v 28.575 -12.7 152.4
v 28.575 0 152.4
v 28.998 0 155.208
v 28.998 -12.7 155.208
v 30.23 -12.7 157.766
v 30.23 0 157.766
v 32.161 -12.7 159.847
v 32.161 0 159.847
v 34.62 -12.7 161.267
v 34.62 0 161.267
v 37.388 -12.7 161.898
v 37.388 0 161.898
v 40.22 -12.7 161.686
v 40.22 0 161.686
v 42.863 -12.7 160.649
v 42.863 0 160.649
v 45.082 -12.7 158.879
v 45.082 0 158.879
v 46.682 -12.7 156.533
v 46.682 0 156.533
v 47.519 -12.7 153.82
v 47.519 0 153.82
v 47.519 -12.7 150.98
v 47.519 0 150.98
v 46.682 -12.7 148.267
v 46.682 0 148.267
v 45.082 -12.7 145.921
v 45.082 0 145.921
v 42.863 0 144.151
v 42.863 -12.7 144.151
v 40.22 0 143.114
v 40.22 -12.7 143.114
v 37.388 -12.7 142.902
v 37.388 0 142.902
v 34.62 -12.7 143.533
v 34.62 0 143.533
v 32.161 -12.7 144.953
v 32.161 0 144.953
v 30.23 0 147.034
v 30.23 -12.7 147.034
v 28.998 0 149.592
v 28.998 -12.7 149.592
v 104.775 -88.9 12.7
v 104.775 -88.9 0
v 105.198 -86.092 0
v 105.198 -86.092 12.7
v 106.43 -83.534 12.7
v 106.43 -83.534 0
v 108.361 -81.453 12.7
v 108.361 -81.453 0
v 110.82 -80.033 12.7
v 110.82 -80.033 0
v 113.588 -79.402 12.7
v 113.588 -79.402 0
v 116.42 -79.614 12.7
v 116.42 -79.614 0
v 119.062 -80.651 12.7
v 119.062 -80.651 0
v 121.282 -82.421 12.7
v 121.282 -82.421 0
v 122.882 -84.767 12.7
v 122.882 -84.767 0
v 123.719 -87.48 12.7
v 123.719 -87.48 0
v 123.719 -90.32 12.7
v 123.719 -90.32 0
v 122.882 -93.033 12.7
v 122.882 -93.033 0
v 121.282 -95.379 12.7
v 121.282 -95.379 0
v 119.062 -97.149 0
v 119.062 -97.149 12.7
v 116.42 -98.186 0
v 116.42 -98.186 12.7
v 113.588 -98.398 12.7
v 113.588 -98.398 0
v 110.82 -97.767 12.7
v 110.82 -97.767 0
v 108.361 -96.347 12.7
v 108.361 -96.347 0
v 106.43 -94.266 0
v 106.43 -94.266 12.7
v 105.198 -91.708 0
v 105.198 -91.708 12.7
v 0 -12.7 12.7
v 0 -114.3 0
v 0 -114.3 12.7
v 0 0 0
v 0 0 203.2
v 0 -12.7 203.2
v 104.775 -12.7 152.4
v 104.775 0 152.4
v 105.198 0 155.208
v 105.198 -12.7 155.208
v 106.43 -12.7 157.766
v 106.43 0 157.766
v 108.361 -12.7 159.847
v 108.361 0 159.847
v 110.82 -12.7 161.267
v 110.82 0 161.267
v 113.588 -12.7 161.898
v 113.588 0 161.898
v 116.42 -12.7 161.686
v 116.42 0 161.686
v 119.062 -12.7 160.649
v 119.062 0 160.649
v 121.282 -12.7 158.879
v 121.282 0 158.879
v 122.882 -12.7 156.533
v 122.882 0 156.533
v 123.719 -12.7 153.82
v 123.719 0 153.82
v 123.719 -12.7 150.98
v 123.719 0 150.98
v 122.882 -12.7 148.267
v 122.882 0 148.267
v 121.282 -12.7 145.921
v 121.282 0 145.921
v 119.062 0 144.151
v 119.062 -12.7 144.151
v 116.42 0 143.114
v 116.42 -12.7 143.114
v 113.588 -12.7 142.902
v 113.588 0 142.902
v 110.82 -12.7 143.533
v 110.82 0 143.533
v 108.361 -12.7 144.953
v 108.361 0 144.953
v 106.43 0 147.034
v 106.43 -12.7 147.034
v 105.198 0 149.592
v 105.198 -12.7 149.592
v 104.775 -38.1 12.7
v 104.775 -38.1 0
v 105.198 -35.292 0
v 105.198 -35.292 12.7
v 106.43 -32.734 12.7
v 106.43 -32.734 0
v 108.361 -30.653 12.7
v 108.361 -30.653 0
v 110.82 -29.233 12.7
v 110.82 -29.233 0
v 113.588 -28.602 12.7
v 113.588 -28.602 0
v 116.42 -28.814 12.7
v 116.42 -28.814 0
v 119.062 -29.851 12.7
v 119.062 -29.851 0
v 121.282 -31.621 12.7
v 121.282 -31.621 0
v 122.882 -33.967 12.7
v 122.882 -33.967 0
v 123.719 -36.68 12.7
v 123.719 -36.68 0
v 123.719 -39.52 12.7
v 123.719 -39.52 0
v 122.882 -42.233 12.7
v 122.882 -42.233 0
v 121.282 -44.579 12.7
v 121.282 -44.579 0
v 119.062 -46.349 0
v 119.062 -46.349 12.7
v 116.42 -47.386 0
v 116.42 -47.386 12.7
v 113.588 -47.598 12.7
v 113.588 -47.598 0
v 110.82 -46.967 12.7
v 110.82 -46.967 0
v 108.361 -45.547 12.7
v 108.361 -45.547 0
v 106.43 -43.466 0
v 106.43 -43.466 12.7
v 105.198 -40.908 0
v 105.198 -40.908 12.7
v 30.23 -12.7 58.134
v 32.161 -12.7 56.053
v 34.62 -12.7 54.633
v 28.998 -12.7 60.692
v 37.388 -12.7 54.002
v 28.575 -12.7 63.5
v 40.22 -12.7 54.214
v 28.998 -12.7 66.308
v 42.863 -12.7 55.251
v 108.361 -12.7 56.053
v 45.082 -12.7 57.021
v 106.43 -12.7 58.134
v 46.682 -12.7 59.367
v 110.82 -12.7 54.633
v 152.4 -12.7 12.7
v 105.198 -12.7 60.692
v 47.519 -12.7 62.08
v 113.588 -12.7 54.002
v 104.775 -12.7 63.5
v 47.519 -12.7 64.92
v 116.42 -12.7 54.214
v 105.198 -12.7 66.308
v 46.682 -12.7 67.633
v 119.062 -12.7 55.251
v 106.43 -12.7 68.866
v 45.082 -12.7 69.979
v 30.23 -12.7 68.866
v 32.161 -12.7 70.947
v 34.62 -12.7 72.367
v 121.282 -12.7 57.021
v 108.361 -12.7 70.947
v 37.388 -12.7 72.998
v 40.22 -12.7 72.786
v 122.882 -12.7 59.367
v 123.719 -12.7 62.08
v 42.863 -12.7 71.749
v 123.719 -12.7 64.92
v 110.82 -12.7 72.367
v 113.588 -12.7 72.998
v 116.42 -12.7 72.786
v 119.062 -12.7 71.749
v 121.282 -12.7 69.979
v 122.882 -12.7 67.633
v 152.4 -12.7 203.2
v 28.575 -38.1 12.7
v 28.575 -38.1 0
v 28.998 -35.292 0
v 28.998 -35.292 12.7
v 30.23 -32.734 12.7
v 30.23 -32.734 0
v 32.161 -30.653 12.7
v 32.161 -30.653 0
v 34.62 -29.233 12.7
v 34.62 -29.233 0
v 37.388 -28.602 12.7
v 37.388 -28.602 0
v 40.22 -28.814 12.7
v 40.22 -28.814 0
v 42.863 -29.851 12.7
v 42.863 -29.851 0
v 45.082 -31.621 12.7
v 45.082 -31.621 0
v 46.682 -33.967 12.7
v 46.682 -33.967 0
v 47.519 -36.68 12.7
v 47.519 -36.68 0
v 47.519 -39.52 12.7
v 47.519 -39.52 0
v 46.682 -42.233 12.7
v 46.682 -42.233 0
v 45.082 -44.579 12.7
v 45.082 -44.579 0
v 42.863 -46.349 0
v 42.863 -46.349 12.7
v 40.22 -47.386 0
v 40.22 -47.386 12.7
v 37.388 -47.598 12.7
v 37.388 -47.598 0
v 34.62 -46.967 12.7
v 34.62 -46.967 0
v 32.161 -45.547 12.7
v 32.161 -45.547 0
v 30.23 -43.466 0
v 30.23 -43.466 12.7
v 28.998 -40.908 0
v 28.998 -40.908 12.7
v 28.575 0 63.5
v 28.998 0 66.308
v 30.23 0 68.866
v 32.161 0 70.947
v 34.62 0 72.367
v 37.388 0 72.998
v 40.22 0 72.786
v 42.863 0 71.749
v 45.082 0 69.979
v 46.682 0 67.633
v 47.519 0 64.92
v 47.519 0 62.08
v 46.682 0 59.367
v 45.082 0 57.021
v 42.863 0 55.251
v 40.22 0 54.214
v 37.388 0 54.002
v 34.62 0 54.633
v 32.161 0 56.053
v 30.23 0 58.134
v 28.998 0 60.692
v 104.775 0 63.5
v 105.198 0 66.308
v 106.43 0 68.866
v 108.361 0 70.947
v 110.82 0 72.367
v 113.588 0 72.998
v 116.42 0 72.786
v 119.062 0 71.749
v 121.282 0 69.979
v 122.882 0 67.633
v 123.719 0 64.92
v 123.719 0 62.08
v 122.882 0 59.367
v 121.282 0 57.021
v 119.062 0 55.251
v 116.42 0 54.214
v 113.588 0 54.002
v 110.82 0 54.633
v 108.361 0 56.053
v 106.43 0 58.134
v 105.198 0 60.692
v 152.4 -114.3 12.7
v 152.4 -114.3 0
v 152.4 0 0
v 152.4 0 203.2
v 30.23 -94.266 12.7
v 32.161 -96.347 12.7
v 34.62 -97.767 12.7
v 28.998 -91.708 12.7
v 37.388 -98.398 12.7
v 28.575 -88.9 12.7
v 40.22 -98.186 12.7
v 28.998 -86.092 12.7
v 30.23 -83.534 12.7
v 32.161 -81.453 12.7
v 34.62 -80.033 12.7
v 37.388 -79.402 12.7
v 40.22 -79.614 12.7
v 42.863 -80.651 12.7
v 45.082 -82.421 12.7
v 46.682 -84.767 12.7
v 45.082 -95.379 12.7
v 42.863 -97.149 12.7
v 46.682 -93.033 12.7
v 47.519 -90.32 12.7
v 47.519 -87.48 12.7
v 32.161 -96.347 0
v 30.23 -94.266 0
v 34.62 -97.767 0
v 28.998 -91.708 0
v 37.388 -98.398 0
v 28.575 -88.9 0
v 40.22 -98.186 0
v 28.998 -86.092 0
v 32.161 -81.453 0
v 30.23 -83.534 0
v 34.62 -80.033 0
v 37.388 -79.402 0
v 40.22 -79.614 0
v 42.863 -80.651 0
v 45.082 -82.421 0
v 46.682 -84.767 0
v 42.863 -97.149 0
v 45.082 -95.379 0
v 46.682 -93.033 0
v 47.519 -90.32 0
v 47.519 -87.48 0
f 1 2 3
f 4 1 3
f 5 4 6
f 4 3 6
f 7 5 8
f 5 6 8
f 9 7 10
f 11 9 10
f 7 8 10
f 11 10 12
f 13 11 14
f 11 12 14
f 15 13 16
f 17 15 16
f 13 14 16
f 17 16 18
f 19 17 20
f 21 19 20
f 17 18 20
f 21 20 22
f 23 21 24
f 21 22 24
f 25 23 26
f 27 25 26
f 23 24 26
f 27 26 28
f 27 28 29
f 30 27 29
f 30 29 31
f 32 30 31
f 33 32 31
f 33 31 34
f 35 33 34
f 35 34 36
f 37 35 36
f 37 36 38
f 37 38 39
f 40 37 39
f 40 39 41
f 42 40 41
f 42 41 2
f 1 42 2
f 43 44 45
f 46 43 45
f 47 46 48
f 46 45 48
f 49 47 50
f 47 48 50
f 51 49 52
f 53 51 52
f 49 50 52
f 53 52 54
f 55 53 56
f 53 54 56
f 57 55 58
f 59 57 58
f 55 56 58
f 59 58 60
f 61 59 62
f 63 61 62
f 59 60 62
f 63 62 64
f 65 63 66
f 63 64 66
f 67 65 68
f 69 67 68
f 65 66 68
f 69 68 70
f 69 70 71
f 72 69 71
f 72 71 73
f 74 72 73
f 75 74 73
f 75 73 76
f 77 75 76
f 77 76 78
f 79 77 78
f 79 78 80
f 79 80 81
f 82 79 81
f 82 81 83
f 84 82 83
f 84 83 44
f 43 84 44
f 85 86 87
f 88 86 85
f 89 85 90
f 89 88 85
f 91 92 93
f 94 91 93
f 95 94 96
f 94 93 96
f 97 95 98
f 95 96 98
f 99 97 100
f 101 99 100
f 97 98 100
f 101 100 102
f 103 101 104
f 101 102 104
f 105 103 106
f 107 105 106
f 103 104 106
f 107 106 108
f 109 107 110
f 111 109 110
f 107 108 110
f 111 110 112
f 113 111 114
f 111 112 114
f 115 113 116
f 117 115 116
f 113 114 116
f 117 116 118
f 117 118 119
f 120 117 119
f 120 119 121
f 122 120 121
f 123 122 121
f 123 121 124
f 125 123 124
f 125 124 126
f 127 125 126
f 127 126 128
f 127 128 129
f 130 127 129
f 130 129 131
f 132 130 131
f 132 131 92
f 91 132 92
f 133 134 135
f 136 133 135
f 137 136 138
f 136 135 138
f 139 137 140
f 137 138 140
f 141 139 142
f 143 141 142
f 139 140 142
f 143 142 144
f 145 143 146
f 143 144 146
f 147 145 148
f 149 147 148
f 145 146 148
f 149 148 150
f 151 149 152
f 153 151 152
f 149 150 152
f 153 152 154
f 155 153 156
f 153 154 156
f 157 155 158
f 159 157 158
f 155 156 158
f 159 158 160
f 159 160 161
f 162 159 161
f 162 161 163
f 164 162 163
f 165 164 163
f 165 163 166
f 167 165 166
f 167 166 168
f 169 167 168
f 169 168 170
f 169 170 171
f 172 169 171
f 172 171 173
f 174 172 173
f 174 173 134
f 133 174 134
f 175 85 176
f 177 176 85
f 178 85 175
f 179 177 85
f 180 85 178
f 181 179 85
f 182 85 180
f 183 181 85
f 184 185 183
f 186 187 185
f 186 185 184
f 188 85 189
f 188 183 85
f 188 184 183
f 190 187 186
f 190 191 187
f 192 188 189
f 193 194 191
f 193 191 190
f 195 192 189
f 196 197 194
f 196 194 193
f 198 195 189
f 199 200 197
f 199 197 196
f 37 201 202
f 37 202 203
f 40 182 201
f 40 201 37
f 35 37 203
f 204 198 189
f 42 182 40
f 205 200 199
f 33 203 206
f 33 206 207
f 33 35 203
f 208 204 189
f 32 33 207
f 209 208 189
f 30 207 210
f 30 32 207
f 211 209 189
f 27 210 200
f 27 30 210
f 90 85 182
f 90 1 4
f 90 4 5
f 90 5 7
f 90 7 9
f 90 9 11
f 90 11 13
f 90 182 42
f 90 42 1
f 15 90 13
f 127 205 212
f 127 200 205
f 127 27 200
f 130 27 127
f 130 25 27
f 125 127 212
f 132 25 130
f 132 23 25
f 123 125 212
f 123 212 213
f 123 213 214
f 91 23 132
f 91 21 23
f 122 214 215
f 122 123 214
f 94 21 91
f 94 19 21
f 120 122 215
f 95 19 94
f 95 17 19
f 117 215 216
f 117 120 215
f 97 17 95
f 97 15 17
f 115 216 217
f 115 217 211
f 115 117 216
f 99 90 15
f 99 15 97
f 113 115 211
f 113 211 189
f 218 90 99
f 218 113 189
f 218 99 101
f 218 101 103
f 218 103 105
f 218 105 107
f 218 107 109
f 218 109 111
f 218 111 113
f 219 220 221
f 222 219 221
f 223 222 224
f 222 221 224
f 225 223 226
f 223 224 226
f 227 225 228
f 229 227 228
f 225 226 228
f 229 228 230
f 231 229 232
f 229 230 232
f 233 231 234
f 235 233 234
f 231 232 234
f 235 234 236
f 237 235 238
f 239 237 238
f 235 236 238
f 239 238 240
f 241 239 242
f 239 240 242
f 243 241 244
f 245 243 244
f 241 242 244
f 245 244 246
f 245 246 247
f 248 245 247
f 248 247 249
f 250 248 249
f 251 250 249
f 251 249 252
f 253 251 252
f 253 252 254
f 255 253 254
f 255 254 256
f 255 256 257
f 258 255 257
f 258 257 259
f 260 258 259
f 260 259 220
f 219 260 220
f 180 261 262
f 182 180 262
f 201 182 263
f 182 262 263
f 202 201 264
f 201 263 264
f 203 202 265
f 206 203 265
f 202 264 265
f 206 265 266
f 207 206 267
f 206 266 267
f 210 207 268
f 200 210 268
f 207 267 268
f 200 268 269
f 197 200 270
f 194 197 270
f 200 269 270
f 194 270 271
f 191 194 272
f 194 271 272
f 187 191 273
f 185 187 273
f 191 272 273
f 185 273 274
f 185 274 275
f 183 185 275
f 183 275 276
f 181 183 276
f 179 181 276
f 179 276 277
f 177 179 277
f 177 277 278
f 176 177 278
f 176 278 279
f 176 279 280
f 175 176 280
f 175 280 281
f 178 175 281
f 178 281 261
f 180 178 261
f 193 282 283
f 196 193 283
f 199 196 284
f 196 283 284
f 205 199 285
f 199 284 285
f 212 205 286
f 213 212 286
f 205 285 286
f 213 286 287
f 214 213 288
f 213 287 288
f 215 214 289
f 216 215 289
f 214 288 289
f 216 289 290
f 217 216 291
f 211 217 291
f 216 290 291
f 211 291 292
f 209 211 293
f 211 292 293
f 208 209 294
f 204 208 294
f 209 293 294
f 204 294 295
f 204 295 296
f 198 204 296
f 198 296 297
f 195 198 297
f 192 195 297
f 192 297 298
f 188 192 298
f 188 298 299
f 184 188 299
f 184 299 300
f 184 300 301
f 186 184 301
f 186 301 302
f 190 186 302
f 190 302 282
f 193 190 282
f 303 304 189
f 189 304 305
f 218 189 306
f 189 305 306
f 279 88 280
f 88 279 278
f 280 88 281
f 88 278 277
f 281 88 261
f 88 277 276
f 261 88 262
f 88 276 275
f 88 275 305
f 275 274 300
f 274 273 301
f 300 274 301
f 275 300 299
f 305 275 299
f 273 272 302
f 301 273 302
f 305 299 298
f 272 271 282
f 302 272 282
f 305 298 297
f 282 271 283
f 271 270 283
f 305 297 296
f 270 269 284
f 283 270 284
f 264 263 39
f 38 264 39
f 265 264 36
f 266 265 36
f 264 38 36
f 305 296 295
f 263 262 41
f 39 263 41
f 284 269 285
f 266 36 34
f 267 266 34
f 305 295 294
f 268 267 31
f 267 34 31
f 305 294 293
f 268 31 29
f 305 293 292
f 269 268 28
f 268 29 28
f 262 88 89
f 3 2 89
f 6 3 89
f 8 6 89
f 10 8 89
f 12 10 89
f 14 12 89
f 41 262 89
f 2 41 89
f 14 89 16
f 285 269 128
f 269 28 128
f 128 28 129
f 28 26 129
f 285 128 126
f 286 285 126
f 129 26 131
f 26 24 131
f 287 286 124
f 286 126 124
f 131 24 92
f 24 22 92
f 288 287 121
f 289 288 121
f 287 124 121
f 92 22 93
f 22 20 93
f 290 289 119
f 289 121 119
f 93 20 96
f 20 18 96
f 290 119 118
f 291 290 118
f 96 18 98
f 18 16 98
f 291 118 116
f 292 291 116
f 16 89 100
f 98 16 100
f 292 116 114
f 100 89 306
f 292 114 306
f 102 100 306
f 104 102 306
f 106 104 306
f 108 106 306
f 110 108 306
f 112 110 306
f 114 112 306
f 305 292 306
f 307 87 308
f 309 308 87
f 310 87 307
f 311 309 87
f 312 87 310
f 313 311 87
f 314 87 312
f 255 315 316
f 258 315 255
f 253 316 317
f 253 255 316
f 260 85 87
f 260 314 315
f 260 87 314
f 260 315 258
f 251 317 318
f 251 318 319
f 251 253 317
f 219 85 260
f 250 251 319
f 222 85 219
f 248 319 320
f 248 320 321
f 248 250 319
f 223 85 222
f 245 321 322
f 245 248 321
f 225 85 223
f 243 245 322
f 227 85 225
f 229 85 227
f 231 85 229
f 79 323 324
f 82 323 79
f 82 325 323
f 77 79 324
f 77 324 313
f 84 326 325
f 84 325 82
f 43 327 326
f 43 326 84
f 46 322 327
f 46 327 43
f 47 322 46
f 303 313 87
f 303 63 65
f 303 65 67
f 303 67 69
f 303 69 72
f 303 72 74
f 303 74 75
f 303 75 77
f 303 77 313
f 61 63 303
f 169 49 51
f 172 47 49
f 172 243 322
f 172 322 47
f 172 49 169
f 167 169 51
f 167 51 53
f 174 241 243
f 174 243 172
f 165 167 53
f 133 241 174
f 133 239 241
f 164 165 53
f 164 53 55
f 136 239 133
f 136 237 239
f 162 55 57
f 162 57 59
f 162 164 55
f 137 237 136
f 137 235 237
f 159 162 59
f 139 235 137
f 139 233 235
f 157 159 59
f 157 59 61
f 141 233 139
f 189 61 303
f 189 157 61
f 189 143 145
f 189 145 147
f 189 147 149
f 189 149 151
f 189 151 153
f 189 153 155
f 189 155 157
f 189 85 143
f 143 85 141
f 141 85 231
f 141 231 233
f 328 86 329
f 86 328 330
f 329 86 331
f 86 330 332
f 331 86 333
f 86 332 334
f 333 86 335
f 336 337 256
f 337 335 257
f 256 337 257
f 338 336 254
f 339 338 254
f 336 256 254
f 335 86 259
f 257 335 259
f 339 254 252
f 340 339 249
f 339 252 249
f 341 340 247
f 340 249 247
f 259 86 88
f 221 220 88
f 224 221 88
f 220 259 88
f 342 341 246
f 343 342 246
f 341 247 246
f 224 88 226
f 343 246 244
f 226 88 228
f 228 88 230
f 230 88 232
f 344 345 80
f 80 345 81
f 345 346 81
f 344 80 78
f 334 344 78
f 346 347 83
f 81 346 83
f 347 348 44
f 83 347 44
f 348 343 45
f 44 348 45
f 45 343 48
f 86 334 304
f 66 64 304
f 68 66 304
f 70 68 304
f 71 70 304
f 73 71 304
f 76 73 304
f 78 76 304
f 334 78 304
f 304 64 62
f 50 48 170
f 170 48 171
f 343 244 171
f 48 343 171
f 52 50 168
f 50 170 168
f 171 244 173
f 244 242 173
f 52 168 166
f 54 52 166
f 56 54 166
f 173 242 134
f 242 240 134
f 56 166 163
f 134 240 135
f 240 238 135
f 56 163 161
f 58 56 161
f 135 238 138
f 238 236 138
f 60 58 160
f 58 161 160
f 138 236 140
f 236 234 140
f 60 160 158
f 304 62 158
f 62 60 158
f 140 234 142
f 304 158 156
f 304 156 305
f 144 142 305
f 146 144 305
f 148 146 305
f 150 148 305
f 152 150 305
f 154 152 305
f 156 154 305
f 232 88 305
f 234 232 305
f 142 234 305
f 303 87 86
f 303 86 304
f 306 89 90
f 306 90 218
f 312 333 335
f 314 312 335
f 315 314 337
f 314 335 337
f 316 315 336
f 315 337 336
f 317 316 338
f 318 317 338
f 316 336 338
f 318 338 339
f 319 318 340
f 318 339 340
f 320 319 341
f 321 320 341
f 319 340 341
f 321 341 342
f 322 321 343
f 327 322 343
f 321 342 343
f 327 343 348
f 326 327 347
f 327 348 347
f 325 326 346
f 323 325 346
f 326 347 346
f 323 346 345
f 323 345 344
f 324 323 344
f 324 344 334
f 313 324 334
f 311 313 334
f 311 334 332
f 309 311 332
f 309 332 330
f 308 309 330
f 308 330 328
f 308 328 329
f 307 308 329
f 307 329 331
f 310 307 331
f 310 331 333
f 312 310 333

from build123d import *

# Parameters (mm, degrees)
F0_W     = 152.4
F0_H     = 203.2
F1_DEPTH = 12.7
F2_W     = 152.4
F2_H     = 12.7
F3_DEPTH = 101.6
F5_D     = 19.05
F5_DEPTH = 12.7
F7_D     = 19.05
F7_DEPTH = 12.7
F9_D     = 19.05
F9_DEPTH = 12.7


with BuildPart() as f1:
    # F0 (on Front) → F1 (new body)
    with BuildSketch(Plane.XZ):
        with Locations((76.2, 101.6)):
            Rectangle(F0_W, F0_H)
    extrude(amount=F1_DEPTH)

    # F2 (on face) → F3 (join)
    with BuildSketch(Plane.XZ.offset(12.7)):
        with Locations((76.2, 6.35)):
            Rectangle(F2_W, F2_H)
    extrude(amount=F3_DEPTH)

    # F5
    with Locations(Plane.XY.offset(12.7)):
        with Locations((38.1, -88.9)):
            Hole(F5_D / 2, depth=F5_DEPTH)

    # F7
    with Locations(Plane.XY.offset(12.7)):
        with Locations((38.1, -38.1), (114.3, -38.1), (114.3, -88.9)):
            Hole(F7_D / 2, depth=F7_DEPTH)

    # F9
    with Locations(Plane.XZ.offset(12.7)):
        with Locations((38.1, 152.4), (114.3, 152.4), (114.3, 63.5), (38.1, 63.5)):
            Hole(F9_D / 2, depth=F9_DEPTH)


solid = f1.part
